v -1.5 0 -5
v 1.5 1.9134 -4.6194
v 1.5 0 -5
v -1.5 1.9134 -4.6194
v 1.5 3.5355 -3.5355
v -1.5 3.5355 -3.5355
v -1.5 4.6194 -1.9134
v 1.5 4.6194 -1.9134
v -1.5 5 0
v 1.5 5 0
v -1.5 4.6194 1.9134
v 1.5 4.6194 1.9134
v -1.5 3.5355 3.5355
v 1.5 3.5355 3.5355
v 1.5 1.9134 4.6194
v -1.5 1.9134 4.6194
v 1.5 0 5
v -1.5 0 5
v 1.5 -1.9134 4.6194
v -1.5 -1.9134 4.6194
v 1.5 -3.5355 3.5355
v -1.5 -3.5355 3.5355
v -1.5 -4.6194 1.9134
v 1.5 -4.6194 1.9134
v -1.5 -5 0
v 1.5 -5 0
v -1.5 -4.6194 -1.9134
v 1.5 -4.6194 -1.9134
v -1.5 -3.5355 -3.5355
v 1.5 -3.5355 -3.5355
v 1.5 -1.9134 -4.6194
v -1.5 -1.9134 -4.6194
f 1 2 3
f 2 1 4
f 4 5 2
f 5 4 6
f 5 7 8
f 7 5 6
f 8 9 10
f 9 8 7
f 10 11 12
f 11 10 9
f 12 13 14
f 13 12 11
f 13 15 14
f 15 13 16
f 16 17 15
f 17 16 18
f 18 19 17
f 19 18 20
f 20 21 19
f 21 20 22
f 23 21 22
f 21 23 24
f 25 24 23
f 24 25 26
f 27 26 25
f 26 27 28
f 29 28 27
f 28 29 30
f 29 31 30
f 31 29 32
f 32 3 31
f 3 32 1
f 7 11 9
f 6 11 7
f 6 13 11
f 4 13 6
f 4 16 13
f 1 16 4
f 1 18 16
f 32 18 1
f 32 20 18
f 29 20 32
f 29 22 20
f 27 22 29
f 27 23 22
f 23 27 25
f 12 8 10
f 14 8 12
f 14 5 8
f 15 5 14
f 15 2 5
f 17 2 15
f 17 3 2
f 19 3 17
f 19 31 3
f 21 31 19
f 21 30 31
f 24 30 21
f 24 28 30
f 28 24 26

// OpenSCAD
module wheel(t=[0,0,0],width=2,height=3){
    color("#444")
    translate(t)
     rotate([90,90,90])
     cylinder(h=3, r=5, center=true);
}
wheel([0,0,0],2,3);
